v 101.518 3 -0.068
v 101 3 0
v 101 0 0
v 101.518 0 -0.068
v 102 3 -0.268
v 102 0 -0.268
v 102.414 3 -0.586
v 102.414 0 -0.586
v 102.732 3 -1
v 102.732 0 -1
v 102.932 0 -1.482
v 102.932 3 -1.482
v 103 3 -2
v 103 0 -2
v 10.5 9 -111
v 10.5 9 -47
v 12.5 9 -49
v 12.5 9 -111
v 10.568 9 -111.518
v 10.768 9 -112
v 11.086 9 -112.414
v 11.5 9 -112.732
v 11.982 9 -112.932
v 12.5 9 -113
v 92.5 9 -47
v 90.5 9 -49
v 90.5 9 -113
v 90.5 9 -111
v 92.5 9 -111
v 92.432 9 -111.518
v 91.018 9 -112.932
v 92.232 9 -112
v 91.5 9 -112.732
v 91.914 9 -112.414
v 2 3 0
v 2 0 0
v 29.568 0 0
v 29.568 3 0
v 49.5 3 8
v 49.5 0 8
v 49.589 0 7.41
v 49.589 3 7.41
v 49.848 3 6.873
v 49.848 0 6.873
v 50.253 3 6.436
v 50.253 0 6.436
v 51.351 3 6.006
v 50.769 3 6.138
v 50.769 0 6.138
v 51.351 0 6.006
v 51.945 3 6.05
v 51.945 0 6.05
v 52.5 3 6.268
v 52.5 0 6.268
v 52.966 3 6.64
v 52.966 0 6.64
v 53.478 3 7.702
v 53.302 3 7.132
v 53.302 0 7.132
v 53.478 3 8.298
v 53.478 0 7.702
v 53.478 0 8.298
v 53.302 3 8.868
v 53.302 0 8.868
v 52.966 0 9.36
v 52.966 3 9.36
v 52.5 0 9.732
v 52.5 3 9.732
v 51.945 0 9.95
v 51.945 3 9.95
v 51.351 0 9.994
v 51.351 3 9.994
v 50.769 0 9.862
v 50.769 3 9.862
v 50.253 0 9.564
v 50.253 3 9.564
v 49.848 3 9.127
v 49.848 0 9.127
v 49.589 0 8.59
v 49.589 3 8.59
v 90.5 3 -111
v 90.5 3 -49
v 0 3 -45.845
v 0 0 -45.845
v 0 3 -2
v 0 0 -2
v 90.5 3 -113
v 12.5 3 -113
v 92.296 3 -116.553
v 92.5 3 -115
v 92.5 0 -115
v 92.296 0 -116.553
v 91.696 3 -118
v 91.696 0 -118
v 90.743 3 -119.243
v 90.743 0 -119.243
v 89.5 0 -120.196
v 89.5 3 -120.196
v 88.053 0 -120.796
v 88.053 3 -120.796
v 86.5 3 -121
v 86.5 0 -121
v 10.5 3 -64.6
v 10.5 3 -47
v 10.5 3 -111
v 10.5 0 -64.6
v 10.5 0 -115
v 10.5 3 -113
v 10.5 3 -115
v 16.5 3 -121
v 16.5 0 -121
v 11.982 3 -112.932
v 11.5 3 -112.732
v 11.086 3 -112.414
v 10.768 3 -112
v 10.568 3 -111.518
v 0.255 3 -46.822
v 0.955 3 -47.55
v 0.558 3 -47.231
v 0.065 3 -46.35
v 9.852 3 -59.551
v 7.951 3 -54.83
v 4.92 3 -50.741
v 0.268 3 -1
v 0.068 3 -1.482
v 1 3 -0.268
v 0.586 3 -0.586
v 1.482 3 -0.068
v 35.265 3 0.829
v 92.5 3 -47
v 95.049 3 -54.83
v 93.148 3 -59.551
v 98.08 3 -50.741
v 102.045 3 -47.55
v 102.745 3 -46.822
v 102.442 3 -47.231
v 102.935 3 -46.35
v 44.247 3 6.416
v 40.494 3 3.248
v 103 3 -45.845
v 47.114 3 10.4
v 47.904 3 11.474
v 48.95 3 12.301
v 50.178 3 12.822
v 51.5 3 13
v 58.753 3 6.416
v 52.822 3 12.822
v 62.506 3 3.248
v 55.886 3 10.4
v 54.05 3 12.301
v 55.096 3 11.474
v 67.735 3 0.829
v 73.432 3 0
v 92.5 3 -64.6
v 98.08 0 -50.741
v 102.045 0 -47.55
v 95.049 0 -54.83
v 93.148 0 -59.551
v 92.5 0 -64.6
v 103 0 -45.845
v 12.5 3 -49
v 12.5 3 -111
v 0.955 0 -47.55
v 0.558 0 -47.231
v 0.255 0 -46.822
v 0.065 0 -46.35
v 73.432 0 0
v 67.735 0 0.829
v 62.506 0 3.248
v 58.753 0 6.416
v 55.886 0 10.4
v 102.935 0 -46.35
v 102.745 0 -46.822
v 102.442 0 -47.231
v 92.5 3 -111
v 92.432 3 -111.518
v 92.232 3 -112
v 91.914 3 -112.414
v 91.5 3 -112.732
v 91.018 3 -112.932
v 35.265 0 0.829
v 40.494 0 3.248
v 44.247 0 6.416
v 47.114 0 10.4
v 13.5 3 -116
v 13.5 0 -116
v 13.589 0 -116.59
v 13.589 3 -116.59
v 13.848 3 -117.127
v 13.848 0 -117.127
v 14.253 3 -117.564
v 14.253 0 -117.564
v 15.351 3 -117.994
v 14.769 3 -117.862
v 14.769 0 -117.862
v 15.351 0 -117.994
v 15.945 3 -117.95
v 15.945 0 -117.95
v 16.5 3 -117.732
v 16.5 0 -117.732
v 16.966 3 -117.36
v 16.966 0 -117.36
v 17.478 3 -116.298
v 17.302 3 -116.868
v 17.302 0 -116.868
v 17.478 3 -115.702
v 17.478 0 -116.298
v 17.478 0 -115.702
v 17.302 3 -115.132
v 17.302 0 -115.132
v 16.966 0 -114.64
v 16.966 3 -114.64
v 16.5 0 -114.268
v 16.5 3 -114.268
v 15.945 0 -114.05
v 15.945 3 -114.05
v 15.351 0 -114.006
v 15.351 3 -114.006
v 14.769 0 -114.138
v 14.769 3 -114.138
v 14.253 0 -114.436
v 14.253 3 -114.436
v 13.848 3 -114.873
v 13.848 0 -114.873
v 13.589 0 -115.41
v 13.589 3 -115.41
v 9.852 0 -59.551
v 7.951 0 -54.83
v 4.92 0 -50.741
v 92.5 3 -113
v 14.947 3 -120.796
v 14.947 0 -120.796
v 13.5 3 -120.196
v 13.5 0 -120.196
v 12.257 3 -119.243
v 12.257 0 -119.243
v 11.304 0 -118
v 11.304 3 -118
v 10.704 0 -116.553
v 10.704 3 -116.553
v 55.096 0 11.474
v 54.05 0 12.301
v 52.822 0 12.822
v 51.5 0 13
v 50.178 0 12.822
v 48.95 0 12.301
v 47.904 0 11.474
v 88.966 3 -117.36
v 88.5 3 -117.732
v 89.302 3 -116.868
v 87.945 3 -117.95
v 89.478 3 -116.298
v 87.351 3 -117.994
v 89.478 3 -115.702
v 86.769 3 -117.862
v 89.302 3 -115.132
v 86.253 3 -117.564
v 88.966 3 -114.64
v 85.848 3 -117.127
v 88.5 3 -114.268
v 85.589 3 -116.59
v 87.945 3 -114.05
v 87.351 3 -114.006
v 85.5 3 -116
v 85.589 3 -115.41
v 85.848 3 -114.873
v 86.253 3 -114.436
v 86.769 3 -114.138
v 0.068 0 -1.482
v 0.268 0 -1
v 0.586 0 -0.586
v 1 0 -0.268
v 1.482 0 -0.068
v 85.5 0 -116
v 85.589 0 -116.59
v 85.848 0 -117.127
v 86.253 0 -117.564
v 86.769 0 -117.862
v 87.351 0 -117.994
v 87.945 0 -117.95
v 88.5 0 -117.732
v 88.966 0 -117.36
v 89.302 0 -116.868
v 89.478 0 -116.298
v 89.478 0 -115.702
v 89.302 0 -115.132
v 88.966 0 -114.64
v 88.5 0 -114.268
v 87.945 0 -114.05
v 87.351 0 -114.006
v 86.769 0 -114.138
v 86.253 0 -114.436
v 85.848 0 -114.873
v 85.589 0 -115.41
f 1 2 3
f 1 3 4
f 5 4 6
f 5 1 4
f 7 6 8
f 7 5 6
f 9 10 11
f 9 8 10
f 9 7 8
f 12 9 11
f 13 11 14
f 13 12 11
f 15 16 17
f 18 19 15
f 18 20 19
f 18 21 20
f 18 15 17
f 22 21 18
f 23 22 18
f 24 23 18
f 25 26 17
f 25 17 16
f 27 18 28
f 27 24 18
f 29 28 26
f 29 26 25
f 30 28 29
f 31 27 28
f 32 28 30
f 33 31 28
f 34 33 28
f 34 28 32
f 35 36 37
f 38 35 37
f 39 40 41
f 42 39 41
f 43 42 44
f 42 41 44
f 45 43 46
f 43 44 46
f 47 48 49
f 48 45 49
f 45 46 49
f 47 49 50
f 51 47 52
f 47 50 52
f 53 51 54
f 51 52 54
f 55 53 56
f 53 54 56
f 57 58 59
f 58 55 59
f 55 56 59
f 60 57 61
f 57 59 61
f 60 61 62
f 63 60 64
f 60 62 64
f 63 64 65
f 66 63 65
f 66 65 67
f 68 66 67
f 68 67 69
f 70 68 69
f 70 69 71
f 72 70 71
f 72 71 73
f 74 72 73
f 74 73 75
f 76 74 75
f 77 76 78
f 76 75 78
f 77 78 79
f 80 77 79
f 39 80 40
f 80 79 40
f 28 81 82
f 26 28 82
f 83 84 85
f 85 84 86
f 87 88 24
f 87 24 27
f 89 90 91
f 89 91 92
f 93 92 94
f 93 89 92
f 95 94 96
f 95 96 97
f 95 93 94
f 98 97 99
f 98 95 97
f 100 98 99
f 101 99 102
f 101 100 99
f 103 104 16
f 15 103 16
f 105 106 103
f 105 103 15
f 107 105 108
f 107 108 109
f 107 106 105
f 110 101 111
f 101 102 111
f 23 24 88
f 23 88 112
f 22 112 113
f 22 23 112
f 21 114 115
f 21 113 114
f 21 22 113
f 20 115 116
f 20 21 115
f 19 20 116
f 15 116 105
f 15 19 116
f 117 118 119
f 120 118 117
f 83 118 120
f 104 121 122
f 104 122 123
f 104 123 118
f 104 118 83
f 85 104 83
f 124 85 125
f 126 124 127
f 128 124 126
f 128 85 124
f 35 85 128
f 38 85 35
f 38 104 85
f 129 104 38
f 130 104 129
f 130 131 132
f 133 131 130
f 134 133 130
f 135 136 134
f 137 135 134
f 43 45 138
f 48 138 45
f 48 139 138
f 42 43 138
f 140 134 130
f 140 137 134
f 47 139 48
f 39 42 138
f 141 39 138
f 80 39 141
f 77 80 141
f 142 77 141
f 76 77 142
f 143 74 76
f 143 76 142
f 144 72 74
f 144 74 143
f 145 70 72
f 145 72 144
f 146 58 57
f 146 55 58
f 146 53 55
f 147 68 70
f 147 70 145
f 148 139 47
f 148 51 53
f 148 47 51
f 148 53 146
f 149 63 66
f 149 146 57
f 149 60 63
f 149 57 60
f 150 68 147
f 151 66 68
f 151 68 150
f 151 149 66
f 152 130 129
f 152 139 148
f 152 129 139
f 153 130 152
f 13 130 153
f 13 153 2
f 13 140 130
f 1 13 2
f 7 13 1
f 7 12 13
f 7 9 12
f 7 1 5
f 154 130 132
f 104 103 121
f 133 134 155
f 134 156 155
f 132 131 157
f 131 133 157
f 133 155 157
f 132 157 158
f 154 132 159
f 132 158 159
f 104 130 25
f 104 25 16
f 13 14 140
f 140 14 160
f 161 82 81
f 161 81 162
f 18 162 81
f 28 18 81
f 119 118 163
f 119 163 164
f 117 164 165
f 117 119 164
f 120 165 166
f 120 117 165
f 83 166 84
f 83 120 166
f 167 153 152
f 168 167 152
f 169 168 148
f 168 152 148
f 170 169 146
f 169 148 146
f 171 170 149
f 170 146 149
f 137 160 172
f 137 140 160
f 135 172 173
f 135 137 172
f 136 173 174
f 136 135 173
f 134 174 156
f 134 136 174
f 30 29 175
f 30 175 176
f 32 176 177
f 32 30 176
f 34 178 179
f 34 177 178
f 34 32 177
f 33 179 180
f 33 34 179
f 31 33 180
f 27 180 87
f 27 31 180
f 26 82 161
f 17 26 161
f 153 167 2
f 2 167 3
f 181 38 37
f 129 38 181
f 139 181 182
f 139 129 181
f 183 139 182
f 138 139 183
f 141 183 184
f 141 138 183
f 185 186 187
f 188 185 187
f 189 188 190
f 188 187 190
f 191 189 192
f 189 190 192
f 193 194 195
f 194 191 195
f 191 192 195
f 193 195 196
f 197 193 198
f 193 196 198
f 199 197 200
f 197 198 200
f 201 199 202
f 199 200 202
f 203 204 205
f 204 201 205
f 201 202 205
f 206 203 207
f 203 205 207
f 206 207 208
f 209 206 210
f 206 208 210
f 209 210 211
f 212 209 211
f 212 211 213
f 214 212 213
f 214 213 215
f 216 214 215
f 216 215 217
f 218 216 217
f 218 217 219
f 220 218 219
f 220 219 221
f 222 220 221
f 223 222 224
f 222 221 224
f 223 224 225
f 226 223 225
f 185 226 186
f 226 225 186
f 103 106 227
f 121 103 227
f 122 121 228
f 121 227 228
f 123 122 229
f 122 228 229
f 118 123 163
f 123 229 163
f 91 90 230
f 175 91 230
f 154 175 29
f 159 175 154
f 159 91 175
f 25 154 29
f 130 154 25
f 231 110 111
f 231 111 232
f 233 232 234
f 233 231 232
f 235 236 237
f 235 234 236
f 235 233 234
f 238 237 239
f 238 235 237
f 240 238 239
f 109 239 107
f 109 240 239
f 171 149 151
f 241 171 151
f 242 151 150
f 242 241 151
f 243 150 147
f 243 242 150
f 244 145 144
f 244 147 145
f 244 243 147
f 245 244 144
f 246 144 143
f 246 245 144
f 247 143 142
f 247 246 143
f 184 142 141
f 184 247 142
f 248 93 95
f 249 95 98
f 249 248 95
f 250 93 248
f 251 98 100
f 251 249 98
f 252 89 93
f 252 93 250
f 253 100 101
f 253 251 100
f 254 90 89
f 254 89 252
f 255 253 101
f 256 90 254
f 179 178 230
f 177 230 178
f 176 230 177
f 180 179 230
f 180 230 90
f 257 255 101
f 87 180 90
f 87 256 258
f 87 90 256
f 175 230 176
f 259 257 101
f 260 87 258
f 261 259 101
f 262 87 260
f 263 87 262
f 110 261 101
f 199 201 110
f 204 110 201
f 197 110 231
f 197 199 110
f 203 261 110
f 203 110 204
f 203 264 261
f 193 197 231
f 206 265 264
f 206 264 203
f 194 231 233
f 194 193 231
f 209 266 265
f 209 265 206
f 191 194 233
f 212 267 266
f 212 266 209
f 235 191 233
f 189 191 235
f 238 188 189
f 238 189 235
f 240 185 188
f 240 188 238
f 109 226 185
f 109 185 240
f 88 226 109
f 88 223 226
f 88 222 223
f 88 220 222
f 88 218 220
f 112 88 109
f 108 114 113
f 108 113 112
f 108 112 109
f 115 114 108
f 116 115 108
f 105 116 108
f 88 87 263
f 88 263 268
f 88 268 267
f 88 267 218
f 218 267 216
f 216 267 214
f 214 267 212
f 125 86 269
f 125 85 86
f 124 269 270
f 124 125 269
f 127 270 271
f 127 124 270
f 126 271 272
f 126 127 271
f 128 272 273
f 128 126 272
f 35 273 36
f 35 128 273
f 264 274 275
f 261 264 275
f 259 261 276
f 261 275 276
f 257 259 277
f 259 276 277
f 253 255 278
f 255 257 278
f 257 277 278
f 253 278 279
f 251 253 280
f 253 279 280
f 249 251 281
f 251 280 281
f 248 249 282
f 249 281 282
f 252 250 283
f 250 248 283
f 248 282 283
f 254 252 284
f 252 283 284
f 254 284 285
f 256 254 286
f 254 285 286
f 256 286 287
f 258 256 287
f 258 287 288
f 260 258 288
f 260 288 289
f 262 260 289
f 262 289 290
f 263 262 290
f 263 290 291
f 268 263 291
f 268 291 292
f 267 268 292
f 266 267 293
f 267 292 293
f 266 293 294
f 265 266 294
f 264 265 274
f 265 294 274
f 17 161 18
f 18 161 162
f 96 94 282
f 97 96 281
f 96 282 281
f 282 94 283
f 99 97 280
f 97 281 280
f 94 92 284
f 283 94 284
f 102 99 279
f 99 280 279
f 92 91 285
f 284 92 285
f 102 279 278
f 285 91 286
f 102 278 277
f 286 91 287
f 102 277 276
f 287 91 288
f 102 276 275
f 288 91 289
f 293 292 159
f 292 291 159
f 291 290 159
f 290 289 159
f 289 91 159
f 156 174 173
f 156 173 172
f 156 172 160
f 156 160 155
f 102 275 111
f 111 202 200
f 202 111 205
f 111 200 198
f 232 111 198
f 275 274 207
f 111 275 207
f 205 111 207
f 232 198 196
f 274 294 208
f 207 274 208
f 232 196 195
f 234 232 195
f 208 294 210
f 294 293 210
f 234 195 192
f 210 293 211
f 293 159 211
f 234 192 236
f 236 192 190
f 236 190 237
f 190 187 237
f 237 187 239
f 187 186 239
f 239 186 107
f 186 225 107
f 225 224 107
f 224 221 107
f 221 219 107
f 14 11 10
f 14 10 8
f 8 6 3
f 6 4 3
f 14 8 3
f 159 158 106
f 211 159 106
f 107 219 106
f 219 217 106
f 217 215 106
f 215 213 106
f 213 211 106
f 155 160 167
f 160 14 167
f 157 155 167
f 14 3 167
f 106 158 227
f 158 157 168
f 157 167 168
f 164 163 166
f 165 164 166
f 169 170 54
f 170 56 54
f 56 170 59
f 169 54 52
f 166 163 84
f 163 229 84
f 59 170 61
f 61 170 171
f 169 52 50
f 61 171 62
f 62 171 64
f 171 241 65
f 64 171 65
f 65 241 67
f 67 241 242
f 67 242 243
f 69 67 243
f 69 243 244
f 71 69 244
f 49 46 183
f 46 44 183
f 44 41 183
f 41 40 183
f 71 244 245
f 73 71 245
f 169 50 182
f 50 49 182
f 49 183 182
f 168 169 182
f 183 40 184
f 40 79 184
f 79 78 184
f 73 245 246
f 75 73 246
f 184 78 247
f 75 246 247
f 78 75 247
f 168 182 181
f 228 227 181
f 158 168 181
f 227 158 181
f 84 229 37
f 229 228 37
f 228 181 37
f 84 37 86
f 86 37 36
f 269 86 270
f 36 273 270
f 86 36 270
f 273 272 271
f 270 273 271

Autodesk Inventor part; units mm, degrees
ref_plane "YZ Plane" through (0, 0, 0) normal (1, 0, 0) x (0, 1, 0)
ref_plane "XZ Plane" through (0, 0, 0) normal (0, 1, 0) x (-1, 0, 0)
ref_plane "XY Plane" through (0, 0, 0) normal (0, 0, 1) x (1, 0, 0)
sketch "Sketch1" plane through (0, 0, 0) normal (0, 1, 0) x (-1, 0, 0)
  line L0 (0, 0) -> (-103, 0)
  line L1 (-103, 0) -> (-103, -121)
  line L2 (-103, -121) -> (0, -121)
  line L3 (0, -121) -> (0, 0)
  line L4 (-10.5, -121) -> (-92.5, -121)
  line L5 (-92.5, -121) -> (-92.5, -49)
  line L6 (-92.5, -49) -> (-10.5, -49)
  line L7 (-10.5, -49) -> (-10.5, -121)
  circle A0 centre (-15.5, -116) radius 2
  circle A1 centre (-87.5, -116) radius 2
  line L8 (0, -49) -> (-47, -49)
  line L9 (-47, -49) -> (-47, -2)
  line L10 (-47, -2) -> (0, -2)
  line L11 (0, -2) -> (0, -49)
  line L12 (-56, -49) -> (-103, -49)
  line L13 (-103, -49) -> (-103, -2)
  line L14 (-103, -2) -> (-56, -2)
  line L15 (-56, -2) -> (-56, -49)
  line L16 (-10.5, -49) -> (0, -49)
  line L17 (-92.5, -49) -> (-103, -49)
  circle A2 centre (-51.5, 8) radius 2
  circle A3 centre (-51.5, 8) radius 5
  line L18 (-46.5, 8) -> (-46.5, 0)
  line L19 (-46.5, 0) -> (-56.5, 0)
  line L20 (-56.5, 0) -> (-56.5, 8)
  line L21 (0, -47) -> (-103, -47)
  line L22 (-10.5, -49) -> (-10.5, -47)
  line L23 (-92.5, -49) -> (-92.5, -47)
  point P0 (0, -62)
  point P1 (-103, -62)
  point P2 (-51.5, -121)
  point P3 (-92.5, -121)
  point P4 (-10.5, -121)
  point P5 (0, -25.5)
  point P6 (-47, -25.5)
  point P7 (-56, -25.5)
  point P8 (-51.5, 0)
  point P9 (-56.5, 8)
  point P10 (-56.5, 0)
  point P11 (-46.5, 0)
  point P12 (-46.5, 8)
  dimension "d0" = 121
  dimension "d1" = 103
  dimension "d3" = 82
  dimension "d4" = 72
  dimension "d5" = 10.5
  dimension "d6" = 4
  dimension "d7" = 5
  dimension "d8" = 5
  dimension "d14" = 5
  dimension "d15" = 5
  dimension "d31" = 47
  dimension "d32" = 47
  dimension "d33" = 47
  dimension "d34" = 47
  dimension "d54" = 51.5
  dimension "d55" = 8
  dimension "d56" = 10
  dimension "d61" = 2
extrude "Extrusion1" add sketch "Sketch1" along normal blind 3 contours L3 L10 L9 L21 L15 L14 L1 L0 | L0 L20 A3 L18 | L3 L21 L9 L10 | A3 | L22 L6 L9 L21 | L9 L6 L15 L21 | L14 L15 L21 L1 | L7 L2 L5 L6 | L15 L6 L23 L21
sketch "Sketch2" plane through (0, 3, 0) normal (0, 1, 0) x (1, 0, 0)
  line L0 (0, 47) -> (47, 47)
  line L1 (47, 47) -> (47, 0)
  line L2 (47, 0) -> (0, 0)
  line L3 (0, 0) -> (0, 47)
  line L4 (0, 47) -> (0, 0) projected
  line L5 (0, 0) -> (103, 0) projected
  line L6 (56, 47) -> (103, 47)
  line L7 (103, 47) -> (103, 0)
  line L8 (103, 0) -> (56, 0)
  line L9 (56, 0) -> (56, 47)
  line L10 (103, 0) -> (103, 47) projected
  line L11 (92.5, 121) -> (10.5, 121) projected
  line L12 (10.5, 49) -> (0, 49) projected
  line L13 (12.5, 109) -> (90.5, 109)
  line L14 (90.5, 109) -> (90.5, 49)
  line L15 (90.5, 49) -> (12.5, 49)
  line L16 (12.5, 49) -> (12.5, 109)
  line L17 (10.5, 49) -> (10.5, 47)
  line L18 (92.5, 49) -> (92.5, 47)
  point P0 (23.5, 47)
  point P1 (105, 48)
  point P2 (0, 24.5)
  point P3 (10.5, 121)
  point P4 (56, 23.5)
  point P5 (47, 23.5)
  point P6 (0, 104.7)
  point P7 (105, 104.7)
  point P8 (103, 49)
  point P9 (90.5, 79)
  point P10 (12.5, 79)
  dimension "d21" = 47
  dimension "d22" = 47
  dimension "d26" = 47
  dimension "d38" = 2
  dimension "d39" = 78
  dimension "d40" = 60
  dimension "d43" = 12.5
sketch "Sketch3" plane through (0, 3, 0) normal (0, 1, 0) x (1, 0, 0)
  line L0 (10.5, 113) -> (92.5, 113)
  line L1 (92.5, 113) -> (92.5, 47)
  line L2 (92.5, 47) -> (10.5, 47)
  line L3 (10.5, 47) -> (10.5, 113)
  line L4 (12.5, 111) -> (90.5, 111)
  line L5 (90.5, 111) -> (90.5, 49)
  line L6 (90.5, 49) -> (12.5, 49)
  line L7 (12.5, 49) -> (12.5, 111)
  line L8 (0, 47) -> (0, 0) projected
  line L9 (0, 0) -> (103, 0) projected
  point P0 (0, 49)
  dimension "d44" = 78
  dimension "d45" = 62
  dimension "d46" = 12.5
  dimension "d47" = 49
  dimension "d48" = 82
  dimension "d49" = 2
  dimension "d51" = 66
  dimension "d52" = 2
fillet "Fillet1" radius 20 2 edges at (56.5, 1.5, 0) (46.5, 1.5, 0)
extrude "Extrusion2" add sketch "Sketch3" along normal blind 6
fillet "Fillet3" radius 20 2 edges at (92.5, 1.5, -47) (10.5, 1.5, -47)
fillet "Fillet4" radius 6 2 edges at (92.5, 1.5, -121) (10.5, 1.5, -121)
fillet "Fillet5" radius 2 6 edges at (0, 1.5, 0) (103, 1.5, 0) (0, 1.5, -47) (103, 1.5, -47) (92.5, 6, -113) (10.5, 6, -113)
equation "\"d0\" = d34 + d37 + d4"
equation "\"d1\" = 2 * d47 + d36"
equation "\"d5\" = -0.5 * d3 + 0.5 * d1"
equation "\"d54\" = 0.5 * d1"
equation "\"d38\" = d37"
equation "\"d43\" = -0.5 * d39 + 0.5 * d1"
equation "\"d44\" = d39"
equation "\"d46\" = d43"
equation "\"d47\" = d38 + d21"
equation "\"d48\" = d3"
equation "\"d2\" = 0.5 * d0"
equation "\"d37\" = 2"
equation "\"d36\" = 5"
properties part number "baseCarrito2"
